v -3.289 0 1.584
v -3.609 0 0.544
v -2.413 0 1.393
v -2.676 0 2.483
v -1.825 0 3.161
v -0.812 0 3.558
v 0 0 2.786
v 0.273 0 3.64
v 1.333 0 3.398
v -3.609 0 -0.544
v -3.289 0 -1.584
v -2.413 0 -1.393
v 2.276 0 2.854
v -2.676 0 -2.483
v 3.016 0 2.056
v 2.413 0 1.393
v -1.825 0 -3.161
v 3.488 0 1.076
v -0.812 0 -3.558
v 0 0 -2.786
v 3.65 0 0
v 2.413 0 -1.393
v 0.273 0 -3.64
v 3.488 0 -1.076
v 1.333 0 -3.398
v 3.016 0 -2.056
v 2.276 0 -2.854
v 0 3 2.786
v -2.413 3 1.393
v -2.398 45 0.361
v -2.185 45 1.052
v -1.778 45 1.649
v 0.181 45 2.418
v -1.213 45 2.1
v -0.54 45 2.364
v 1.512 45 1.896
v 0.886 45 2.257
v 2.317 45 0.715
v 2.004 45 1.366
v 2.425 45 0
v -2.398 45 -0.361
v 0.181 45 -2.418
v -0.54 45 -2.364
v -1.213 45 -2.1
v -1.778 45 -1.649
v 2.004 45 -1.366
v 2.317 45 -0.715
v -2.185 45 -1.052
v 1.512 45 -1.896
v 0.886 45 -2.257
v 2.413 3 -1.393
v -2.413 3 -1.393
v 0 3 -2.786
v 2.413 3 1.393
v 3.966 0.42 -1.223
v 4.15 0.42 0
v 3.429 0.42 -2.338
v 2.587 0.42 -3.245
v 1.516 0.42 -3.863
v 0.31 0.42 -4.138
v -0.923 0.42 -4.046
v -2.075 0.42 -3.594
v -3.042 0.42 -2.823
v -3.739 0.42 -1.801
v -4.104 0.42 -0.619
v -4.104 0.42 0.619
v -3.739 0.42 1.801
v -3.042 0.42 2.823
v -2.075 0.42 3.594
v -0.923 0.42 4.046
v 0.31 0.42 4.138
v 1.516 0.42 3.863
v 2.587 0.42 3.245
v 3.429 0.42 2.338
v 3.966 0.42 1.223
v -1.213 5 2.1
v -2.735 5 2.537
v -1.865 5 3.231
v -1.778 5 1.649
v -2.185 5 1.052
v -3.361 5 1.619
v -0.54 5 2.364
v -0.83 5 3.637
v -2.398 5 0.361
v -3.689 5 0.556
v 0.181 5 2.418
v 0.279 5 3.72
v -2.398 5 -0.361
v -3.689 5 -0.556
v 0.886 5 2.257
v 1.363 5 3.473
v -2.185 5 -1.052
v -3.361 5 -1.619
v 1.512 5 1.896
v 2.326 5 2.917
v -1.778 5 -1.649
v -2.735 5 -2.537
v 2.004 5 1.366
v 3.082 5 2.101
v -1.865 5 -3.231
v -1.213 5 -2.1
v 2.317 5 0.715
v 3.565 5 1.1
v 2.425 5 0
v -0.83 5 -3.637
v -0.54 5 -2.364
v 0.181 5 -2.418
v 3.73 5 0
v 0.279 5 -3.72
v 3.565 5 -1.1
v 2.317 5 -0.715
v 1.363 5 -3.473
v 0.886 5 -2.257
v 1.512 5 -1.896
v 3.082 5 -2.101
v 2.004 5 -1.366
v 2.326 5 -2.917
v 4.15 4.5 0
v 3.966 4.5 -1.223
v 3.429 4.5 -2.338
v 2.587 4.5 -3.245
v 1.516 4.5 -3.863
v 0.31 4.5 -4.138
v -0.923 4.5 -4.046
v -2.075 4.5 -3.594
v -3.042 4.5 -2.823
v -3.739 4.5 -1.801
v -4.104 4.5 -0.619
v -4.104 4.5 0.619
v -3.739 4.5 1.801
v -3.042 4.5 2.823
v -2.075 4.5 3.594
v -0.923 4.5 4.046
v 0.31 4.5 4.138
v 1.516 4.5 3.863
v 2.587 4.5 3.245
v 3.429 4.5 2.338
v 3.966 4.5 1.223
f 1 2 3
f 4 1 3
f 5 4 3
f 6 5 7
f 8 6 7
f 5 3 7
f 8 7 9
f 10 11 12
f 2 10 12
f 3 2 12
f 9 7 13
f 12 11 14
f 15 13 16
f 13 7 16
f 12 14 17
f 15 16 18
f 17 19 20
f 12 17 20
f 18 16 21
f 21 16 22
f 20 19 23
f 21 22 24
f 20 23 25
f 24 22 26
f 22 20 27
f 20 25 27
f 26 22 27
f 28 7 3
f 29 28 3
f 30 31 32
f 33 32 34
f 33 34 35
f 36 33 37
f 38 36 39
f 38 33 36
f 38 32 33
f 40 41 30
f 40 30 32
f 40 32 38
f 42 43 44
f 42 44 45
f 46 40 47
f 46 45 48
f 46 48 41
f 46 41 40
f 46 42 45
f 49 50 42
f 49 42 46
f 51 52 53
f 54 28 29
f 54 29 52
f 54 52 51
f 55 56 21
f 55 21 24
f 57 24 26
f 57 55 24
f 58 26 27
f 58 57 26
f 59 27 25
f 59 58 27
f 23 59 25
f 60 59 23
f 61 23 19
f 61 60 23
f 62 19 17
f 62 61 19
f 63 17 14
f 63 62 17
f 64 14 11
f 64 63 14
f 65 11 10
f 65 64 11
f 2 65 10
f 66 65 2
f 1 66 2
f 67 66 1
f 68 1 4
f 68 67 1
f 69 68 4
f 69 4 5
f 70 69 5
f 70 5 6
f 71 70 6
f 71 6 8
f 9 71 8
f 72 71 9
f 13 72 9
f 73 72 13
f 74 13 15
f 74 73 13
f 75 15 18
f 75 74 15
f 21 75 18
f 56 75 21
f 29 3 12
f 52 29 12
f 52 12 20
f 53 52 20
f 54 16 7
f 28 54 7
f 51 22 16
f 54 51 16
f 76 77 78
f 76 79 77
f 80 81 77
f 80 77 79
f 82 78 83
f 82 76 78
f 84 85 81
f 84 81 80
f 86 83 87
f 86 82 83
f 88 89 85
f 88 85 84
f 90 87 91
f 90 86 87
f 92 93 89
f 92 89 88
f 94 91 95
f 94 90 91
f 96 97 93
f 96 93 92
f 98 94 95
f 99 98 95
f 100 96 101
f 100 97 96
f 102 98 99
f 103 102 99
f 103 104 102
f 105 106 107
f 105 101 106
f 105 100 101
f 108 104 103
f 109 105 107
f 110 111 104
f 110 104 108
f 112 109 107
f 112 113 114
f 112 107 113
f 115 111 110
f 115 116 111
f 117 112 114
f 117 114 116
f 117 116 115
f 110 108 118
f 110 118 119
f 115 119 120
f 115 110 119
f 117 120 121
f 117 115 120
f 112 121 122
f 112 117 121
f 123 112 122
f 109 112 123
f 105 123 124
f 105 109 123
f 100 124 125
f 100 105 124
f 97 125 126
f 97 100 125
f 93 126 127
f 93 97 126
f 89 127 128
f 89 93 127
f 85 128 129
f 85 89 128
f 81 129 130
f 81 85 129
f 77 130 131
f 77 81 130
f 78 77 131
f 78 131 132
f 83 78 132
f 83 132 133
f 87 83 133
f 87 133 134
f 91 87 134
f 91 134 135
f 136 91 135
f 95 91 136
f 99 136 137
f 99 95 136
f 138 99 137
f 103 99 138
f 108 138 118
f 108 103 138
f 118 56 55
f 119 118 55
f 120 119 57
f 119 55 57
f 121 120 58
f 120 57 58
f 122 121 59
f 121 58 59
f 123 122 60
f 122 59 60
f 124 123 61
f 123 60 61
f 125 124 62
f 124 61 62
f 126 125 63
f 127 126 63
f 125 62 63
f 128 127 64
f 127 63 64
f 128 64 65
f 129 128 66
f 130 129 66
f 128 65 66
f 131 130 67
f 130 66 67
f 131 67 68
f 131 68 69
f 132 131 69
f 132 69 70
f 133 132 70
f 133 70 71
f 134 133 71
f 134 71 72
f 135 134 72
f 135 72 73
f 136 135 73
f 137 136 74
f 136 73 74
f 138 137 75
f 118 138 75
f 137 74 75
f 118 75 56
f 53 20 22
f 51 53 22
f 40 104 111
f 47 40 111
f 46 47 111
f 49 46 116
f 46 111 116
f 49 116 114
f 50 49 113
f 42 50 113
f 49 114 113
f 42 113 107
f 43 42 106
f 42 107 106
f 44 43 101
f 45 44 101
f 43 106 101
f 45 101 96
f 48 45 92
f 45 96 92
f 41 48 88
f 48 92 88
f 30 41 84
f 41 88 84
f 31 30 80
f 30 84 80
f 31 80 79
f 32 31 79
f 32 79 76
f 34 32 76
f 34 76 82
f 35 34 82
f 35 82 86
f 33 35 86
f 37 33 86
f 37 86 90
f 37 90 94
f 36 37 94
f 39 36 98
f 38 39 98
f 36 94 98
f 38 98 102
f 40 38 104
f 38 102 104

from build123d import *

# Parameters (mm, degrees)
SKETCH1_R             = 4.15
BOSS_EXTRUDE1_DEPTH   = 5
SKETCH2_R             = 2.425
BOSS_EXTRUDE2_DEPTH   = 40
CUT_EXTRUDE1_DEPTH    = 3
CHAMFER1_SIZE         = 0.5
CHAMFER1_SIZE2        = 0.419549816
CHAMFER1_PART_2_SIZE  = 0.5
CHAMFER1_PART_2_SIZE2 = 0.419549816


with BuildPart() as part:
    # Sketch1 → Boss-Extrude1 (new body)
    with BuildSketch(Plane(origin=(0, 0, 0), x_dir=(1, 0, 0), z_dir=(0, 1, 0))):
        Circle(SKETCH1_R)
    extrude(amount=BOSS_EXTRUDE1_DEPTH)

    # Sketch2 → Boss-Extrude2 (add)
    with BuildSketch(Plane(origin=(0, 5, 0), x_dir=(1, 0, 0), z_dir=(0, 1, 0))):
        Circle(SKETCH2_R)
    extrude(amount=BOSS_EXTRUDE2_DEPTH)

    # Sketch3 → Cut-Extrude1 (cut)
    with BuildSketch(Plane.XZ):
        Polygon((0, 2.786041865), (-2.412783031, 1.393020932), (-2.412783031, -1.393020932), (0, -2.786041865), (2.412783031, -1.393020932), (2.412783031, 1.393020932), align=None)
    extrude(amount=-CUT_EXTRUDE1_DEPTH, mode=Mode.SUBTRACT)

    # Chamfer1
    chamfer1_edges = [part.edges().sort_by_distance(p)[0] for p in [
        (-4.15, 0, 0),
    ]]
    chamfer1_side = [part.faces().sort_by_distance(p)[0] for p in [
        (-4.032620274, 0, 0),
    ]]
    chamfer(chamfer1_edges, length=CHAMFER1_SIZE, length2=CHAMFER1_SIZE2, reference=chamfer1_side[0])

    # Chamfer1 part 2
    chamfer1_part_2_edges = [part.edges().sort_by_distance(p)[0] for p in [
        (-4.15, 5, 0),
    ]]
    chamfer1_part_2_side = [part.faces().sort_by_distance(p)[0] for p in [
        (-4.15, 2.5, 0),
    ]]
    chamfer(chamfer1_part_2_edges, length=CHAMFER1_PART_2_SIZE, length2=CHAMFER1_PART_2_SIZE2, reference=chamfer1_part_2_side[0])


solid = part.part
